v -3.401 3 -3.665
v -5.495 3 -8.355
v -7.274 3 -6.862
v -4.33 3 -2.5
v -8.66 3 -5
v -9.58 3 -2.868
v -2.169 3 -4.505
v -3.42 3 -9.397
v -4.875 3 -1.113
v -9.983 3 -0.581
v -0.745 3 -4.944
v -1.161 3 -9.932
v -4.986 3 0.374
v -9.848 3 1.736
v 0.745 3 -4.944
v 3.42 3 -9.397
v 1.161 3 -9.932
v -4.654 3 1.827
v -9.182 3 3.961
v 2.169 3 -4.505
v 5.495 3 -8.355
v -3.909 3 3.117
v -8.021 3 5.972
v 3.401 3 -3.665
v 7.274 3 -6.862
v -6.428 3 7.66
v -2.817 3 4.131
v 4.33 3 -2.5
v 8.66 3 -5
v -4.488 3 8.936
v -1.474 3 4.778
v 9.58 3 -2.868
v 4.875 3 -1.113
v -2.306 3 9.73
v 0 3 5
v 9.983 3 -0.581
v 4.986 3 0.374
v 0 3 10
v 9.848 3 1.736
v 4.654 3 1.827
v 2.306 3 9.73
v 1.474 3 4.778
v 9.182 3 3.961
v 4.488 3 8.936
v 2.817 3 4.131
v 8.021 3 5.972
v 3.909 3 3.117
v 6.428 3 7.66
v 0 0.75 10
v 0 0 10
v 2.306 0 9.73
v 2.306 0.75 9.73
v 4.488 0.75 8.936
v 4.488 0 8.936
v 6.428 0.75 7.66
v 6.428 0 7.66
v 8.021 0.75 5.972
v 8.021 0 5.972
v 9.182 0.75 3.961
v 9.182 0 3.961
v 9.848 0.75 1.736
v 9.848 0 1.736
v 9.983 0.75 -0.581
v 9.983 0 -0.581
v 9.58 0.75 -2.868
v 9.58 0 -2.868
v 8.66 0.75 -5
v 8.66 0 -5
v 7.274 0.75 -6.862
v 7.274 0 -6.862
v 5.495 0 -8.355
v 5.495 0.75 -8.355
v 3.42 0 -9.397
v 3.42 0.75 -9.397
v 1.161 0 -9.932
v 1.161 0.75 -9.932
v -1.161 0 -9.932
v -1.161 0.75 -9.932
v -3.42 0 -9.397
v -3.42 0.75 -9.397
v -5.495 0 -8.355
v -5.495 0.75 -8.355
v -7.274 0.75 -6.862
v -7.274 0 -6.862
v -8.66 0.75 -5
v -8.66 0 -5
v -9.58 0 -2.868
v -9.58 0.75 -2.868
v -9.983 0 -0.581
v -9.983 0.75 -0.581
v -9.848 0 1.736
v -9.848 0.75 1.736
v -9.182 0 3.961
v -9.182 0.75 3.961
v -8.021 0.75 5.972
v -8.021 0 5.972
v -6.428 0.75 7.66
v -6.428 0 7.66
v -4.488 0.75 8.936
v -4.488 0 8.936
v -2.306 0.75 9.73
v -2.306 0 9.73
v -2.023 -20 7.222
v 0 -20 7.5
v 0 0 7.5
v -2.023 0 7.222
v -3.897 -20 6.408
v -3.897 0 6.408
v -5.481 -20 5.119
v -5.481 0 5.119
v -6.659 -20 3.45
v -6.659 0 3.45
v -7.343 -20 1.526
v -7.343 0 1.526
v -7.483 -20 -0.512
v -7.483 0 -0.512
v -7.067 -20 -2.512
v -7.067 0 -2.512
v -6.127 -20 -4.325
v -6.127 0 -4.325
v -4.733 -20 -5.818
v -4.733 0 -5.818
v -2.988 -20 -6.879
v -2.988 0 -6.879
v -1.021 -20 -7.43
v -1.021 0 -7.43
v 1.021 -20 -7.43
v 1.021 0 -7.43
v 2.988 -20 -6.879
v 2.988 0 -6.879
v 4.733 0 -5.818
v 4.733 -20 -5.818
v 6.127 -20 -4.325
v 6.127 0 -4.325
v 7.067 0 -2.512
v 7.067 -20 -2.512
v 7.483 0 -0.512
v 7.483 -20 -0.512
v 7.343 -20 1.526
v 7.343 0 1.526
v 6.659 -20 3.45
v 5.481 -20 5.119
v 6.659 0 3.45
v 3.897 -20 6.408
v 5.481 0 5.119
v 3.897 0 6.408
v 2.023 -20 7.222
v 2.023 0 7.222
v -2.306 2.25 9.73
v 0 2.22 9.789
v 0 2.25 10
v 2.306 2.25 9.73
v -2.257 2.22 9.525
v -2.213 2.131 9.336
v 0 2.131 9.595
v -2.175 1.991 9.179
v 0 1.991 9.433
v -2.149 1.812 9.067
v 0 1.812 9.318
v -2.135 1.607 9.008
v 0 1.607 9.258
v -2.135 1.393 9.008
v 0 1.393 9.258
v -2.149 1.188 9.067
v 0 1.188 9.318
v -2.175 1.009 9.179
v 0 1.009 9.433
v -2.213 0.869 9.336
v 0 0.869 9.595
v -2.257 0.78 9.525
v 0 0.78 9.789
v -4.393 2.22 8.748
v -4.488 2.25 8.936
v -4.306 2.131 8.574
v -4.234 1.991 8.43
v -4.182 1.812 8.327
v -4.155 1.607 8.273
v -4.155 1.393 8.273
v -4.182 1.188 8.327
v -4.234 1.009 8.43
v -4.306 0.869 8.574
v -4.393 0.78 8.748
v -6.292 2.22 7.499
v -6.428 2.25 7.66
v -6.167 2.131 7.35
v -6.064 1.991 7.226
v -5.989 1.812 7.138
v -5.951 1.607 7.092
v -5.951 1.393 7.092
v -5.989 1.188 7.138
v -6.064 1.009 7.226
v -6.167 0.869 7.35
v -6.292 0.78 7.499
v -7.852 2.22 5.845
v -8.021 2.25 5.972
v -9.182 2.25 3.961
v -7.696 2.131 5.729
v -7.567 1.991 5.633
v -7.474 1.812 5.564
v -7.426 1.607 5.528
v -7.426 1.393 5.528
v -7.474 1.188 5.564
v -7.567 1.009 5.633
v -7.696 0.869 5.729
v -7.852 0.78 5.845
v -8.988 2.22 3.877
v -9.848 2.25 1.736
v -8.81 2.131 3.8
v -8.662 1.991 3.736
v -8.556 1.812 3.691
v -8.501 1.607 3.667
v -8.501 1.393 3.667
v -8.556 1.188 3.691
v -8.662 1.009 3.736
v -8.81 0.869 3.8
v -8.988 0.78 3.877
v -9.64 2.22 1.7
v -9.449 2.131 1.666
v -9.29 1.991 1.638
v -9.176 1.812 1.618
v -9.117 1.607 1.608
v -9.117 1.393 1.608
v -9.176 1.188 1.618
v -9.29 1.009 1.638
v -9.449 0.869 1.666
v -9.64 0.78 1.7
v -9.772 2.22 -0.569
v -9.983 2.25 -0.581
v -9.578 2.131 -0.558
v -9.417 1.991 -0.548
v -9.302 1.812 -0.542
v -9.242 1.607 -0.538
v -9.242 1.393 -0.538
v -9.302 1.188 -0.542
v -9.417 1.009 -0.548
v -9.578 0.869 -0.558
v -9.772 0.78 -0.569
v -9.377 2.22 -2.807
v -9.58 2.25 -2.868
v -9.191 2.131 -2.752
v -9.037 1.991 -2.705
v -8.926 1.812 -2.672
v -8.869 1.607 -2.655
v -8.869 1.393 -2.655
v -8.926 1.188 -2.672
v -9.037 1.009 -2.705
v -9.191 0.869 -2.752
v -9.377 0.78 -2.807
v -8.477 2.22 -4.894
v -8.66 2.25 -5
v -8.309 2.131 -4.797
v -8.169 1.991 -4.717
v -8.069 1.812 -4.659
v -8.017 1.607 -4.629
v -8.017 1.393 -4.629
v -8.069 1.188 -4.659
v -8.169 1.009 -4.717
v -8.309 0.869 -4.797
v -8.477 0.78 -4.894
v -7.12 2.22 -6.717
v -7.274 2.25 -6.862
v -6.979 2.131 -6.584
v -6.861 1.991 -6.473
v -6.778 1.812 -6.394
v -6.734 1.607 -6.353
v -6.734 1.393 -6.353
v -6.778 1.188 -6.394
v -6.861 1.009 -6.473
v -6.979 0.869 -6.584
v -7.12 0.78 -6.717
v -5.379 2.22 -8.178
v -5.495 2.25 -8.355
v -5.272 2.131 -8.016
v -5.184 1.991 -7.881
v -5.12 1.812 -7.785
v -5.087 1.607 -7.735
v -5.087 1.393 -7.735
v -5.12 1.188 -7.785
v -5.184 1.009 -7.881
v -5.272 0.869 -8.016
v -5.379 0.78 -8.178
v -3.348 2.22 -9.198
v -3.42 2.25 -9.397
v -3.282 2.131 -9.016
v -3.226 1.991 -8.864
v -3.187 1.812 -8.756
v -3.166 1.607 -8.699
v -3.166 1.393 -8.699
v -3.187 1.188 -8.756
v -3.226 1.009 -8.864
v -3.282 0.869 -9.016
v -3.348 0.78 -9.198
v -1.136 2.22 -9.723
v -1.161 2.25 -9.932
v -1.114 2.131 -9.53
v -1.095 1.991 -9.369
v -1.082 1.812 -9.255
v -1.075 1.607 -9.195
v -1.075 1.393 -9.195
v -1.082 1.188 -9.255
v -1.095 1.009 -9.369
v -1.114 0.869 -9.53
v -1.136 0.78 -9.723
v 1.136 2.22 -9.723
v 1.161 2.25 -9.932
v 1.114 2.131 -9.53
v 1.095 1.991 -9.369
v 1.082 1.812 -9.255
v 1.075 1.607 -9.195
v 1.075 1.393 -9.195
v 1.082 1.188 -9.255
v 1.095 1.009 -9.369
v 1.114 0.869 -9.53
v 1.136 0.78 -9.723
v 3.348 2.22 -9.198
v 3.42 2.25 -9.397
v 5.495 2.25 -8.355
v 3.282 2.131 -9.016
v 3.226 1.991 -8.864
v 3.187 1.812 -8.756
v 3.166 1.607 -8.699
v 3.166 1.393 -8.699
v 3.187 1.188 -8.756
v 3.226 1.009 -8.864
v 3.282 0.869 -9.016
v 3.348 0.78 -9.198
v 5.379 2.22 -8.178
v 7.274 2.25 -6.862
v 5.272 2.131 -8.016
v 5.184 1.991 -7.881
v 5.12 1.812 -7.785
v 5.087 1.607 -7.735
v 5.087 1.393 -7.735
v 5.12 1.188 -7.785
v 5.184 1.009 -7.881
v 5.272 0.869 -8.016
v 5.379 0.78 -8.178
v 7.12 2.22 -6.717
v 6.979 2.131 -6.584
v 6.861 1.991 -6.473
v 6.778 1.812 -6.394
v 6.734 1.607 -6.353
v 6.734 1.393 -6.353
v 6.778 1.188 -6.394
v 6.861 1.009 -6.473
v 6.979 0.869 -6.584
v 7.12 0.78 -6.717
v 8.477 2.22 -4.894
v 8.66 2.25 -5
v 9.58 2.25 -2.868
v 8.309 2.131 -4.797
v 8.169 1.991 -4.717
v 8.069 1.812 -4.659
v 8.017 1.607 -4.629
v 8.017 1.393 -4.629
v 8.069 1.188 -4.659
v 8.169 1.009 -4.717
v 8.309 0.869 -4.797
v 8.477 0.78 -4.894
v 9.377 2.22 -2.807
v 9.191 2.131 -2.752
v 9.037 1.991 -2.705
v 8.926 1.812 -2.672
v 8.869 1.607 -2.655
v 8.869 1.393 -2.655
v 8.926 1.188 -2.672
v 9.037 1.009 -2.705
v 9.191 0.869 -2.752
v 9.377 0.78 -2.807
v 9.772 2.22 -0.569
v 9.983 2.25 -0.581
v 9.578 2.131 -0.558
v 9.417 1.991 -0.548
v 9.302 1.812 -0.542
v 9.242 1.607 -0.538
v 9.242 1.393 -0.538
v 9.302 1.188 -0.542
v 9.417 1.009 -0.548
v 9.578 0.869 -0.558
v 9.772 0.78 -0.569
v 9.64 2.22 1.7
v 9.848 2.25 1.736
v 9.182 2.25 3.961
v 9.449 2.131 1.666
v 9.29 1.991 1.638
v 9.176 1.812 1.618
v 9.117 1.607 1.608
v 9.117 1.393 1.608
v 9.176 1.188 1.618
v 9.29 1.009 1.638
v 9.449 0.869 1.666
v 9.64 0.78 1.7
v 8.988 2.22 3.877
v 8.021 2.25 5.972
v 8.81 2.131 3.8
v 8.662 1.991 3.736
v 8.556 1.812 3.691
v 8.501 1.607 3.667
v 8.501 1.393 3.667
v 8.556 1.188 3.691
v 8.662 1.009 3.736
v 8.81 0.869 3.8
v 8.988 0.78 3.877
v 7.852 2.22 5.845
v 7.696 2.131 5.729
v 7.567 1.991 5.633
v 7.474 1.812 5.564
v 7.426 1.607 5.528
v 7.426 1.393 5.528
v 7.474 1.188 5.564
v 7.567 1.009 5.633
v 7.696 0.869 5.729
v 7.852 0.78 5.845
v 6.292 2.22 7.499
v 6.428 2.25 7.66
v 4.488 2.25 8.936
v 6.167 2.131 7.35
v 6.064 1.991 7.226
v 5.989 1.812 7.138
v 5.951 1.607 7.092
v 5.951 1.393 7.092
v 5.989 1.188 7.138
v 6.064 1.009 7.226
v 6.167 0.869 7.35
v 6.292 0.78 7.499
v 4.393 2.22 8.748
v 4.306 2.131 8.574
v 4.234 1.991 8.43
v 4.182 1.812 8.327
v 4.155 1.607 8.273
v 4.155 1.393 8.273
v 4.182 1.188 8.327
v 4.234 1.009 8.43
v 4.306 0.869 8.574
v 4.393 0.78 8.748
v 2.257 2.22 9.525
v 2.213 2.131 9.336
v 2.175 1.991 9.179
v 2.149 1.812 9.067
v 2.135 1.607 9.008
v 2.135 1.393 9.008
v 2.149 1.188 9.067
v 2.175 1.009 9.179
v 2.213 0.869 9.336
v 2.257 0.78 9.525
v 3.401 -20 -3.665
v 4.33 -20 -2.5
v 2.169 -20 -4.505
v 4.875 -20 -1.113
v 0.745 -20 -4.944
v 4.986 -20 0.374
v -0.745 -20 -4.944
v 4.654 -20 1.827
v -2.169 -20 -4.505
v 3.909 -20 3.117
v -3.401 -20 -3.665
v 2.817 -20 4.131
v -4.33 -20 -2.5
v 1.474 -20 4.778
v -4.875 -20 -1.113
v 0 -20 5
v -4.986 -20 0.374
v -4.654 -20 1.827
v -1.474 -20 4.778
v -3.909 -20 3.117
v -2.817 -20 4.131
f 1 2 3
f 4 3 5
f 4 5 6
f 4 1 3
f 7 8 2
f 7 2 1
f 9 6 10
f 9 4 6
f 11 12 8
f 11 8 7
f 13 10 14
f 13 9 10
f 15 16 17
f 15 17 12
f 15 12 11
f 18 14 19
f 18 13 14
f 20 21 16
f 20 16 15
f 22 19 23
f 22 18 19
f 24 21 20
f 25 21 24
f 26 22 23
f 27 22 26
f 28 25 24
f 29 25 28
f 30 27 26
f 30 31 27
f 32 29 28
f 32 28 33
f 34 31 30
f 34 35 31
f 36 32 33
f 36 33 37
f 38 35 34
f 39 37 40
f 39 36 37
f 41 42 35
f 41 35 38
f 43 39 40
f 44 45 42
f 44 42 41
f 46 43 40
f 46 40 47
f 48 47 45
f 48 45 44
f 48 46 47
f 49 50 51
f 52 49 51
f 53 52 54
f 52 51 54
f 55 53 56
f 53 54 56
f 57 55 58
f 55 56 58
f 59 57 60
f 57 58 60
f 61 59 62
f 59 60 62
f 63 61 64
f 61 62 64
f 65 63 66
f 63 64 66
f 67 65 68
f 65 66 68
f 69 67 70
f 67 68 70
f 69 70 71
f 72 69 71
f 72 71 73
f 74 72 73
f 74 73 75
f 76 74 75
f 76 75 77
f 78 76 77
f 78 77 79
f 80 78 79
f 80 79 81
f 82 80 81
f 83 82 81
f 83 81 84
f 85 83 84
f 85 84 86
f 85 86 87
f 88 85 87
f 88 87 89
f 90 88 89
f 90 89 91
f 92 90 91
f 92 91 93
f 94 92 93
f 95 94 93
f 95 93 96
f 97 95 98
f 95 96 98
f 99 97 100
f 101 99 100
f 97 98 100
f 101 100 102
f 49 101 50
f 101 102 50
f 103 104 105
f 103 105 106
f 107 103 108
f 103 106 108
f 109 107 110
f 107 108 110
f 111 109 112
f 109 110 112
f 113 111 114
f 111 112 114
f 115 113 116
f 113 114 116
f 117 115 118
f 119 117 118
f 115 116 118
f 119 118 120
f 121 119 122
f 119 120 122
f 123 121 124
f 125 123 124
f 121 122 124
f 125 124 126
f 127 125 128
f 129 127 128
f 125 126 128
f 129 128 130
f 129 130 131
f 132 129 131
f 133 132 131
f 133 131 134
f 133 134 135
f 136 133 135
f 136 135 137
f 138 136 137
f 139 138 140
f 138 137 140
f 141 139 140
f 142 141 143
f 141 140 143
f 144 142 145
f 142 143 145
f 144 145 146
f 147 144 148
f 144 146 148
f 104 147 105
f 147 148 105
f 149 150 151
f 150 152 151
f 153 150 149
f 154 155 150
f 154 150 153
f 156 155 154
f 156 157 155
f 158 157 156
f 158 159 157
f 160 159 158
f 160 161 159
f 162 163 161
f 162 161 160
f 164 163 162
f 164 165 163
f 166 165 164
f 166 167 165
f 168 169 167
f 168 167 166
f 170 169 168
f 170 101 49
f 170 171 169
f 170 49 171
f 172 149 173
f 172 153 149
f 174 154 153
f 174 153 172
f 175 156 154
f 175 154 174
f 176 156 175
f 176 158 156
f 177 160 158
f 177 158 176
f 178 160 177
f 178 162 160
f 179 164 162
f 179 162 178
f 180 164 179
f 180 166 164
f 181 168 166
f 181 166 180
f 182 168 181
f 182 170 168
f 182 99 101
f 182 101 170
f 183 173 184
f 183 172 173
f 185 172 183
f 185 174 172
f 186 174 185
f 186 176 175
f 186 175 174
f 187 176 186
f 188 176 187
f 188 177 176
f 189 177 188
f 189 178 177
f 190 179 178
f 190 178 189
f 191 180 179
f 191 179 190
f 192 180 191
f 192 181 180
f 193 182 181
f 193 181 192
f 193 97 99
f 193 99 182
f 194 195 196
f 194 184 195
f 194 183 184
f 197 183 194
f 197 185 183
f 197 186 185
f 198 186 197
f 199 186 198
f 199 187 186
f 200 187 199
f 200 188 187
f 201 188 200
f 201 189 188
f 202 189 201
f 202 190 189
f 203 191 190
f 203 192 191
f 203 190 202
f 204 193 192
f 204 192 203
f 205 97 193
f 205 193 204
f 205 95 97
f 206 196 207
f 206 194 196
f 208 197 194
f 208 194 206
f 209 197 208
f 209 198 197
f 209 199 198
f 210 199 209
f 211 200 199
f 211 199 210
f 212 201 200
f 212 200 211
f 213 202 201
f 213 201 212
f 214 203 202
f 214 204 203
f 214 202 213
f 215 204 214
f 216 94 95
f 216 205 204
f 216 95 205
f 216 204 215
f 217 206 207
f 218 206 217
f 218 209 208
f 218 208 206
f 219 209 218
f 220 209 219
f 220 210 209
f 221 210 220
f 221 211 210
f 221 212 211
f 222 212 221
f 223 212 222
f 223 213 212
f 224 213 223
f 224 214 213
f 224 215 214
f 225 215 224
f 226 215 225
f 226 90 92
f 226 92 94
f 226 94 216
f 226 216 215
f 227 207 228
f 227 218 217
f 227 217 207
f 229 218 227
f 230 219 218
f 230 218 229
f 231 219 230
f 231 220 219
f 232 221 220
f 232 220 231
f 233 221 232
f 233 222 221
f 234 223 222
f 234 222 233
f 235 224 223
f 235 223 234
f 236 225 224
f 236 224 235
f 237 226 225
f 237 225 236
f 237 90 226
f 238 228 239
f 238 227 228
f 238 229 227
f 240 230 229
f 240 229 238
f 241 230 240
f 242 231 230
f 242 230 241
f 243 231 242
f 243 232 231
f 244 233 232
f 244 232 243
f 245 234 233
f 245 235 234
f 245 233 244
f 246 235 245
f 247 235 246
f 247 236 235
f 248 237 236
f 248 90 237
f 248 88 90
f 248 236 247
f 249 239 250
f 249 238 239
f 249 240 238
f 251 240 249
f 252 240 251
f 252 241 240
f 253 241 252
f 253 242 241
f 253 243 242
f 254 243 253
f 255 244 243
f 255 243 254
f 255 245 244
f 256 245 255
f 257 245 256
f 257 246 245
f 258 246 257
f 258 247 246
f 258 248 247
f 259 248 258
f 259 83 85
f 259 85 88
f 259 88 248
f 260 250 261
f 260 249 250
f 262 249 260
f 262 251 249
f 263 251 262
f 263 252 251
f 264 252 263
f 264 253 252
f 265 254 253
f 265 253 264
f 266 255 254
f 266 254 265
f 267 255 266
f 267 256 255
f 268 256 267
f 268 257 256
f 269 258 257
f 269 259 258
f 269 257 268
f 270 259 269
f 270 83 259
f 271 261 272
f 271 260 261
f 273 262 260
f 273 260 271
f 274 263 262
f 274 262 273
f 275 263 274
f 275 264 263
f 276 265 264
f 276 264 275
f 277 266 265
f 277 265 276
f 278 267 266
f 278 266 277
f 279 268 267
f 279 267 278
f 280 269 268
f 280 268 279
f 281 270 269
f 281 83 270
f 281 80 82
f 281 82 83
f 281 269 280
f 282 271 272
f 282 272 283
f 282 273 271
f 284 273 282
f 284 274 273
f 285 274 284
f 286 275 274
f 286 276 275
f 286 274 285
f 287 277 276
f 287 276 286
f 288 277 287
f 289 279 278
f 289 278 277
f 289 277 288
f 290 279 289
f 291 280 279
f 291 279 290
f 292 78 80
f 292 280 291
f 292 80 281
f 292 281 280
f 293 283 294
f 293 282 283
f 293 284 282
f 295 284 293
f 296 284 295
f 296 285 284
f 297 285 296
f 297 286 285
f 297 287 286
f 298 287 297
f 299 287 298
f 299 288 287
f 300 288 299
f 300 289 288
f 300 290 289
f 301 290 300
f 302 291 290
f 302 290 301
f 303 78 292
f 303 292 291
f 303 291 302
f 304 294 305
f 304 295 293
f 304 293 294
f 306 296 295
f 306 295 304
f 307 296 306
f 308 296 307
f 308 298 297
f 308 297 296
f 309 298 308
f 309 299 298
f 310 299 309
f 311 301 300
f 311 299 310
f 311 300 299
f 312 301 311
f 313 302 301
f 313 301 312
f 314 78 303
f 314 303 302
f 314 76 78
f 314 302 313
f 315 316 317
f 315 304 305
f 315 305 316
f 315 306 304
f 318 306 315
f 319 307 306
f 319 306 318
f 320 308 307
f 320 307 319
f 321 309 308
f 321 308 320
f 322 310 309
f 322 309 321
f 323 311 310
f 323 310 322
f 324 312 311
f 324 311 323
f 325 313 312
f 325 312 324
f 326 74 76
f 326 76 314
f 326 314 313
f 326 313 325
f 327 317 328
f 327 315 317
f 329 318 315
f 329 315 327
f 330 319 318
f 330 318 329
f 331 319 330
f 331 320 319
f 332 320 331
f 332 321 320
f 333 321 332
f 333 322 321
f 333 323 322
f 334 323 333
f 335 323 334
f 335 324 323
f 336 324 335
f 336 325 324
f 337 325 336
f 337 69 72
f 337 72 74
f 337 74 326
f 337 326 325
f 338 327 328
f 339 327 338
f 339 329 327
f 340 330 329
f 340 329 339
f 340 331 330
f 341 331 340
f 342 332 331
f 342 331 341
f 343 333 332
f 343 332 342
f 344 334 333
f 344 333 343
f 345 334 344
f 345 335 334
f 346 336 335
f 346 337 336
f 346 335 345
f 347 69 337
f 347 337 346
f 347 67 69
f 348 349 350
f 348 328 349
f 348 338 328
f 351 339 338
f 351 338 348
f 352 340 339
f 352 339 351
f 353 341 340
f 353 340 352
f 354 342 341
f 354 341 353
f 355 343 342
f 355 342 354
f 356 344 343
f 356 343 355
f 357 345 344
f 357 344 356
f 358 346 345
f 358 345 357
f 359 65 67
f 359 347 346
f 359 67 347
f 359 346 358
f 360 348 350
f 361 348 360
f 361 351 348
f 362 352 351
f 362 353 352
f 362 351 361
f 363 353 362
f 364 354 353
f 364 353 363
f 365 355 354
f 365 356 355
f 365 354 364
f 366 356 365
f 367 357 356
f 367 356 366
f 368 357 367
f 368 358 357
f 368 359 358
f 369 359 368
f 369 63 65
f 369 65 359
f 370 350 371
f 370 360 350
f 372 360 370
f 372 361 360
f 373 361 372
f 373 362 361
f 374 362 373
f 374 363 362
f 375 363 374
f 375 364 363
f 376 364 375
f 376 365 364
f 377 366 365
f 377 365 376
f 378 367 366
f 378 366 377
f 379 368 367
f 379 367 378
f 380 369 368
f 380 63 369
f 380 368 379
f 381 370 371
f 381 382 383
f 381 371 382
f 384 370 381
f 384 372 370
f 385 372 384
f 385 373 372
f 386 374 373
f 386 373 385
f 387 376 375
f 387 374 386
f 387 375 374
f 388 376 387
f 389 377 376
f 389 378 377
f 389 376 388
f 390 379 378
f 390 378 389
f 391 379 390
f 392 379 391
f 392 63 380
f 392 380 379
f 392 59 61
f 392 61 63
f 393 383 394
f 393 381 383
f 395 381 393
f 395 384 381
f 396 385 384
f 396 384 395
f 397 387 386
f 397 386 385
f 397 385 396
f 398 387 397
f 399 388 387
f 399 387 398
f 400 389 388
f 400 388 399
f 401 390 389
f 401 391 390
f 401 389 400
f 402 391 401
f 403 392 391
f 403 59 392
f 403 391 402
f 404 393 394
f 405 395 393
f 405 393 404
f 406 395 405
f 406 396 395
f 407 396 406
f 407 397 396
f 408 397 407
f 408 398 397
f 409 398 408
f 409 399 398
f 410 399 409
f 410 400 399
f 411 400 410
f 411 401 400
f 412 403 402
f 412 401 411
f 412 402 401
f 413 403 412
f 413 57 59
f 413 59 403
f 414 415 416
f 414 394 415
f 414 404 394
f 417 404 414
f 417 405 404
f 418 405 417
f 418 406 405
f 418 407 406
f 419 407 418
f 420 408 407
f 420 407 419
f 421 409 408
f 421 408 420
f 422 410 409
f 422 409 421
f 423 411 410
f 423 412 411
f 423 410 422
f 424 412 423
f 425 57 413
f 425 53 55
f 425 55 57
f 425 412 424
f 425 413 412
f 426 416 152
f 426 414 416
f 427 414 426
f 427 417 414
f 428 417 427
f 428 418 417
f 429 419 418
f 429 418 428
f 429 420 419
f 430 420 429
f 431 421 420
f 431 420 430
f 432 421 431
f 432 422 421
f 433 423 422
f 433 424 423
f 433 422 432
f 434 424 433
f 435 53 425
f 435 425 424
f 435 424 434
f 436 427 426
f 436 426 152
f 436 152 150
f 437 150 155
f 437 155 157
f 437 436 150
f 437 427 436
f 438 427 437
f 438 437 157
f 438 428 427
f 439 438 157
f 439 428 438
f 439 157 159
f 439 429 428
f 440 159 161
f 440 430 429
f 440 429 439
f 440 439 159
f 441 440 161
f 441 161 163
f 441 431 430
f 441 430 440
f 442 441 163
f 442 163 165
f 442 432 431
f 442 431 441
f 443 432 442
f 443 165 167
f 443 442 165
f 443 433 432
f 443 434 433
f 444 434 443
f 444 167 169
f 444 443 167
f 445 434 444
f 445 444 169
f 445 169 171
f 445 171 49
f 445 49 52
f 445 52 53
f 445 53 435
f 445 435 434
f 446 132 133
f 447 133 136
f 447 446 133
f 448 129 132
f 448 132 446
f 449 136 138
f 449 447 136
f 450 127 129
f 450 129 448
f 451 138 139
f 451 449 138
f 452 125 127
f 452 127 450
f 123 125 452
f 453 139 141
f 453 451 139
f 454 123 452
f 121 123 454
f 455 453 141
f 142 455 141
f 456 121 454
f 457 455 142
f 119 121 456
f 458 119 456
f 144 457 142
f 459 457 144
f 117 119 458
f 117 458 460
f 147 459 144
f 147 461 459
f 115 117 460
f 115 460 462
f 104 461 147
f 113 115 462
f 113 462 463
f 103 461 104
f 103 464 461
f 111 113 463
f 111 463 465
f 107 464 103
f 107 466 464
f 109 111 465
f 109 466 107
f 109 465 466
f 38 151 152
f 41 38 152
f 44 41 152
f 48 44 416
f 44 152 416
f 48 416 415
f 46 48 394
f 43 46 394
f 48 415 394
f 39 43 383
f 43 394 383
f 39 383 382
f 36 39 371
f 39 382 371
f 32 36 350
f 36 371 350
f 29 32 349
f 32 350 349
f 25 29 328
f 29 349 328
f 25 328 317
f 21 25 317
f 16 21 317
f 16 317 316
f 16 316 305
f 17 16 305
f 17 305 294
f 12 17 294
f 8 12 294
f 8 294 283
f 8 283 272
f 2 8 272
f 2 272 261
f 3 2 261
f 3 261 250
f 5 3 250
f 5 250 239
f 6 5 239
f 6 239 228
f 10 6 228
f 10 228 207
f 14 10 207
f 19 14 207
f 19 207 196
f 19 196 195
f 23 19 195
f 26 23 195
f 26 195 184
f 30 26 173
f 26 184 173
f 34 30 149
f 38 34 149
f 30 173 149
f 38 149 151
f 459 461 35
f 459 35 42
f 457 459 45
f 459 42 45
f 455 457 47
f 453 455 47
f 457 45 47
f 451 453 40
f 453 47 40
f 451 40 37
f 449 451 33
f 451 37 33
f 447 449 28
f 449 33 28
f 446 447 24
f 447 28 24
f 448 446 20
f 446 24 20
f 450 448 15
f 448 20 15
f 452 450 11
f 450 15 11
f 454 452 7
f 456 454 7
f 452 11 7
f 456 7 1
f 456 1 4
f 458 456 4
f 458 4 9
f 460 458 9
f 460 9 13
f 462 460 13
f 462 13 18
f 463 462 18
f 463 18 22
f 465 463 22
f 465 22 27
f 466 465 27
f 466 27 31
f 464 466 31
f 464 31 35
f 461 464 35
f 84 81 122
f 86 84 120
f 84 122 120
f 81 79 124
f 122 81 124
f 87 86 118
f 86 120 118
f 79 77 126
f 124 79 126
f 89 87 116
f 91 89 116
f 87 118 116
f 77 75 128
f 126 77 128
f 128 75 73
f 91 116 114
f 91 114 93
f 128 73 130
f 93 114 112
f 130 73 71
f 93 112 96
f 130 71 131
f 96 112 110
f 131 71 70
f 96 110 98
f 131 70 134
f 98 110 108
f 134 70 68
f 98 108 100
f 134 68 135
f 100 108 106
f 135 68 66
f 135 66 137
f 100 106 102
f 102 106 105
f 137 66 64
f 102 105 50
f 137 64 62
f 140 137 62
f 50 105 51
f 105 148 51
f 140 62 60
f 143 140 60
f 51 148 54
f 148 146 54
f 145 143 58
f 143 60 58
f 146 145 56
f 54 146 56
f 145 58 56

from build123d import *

# Parameters (mm, degrees)
CROQUIS1_R              = 10
SALIENTE_EXTRUIR1_DEPTH = 3
CROQUIS2_R              = 0.75
CROQUIS4_R              = 7.5
SALIENTE_EXTRUIR2_DEPTH = 20
CROQUIS3_R              = 5
CORTAR_EXTRUIR1_DEPTH   = 28


with BuildPart() as part:
    # Croquis1 → Saliente-Extruir1 (new body)
    with BuildSketch(Plane(origin=(0, 0, 0), x_dir=(1, 0, 0), z_dir=(0, 1, 0))):
        with Locations(Location((0, 0, 0), (0, 0, 270))):
            Circle(CROQUIS1_R)
    extrude(amount=SALIENTE_EXTRUIR1_DEPTH)

    # Croquis2 → Cortar-Revolución1 (revolve, cut)
    with BuildSketch(Plane(origin=(0, 0, 0), x_dir=(0, 0, -1), z_dir=(1, 0, 0)), mode=Mode.PRIVATE) as cortar_revoluci_n1_sk:
        with Locations((10, 1.5)):
            Circle(CROQUIS2_R)
    revolve(cortar_revoluci_n1_sk.sketch.rotate(Axis((0, 3, 0), (0, -1, 0)), 180), axis=Axis((0, 3, 0), (0, -1, 0)), mode=Mode.SUBTRACT)

    # Croquis4 → Saliente-Extruir2 (add)
    with BuildSketch(Plane.XZ):
        with Locations(Location((0, 0, 0), (0, 0, 90))):
            Circle(CROQUIS4_R)
    extrude(amount=SALIENTE_EXTRUIR2_DEPTH)

    # Croquis3 → Cortar-Extruir1 (cut, through all)
    with BuildSketch(Plane(origin=(0, 3, 0), x_dir=(1, 0, 0), z_dir=(0, 1, 0))):
        with Locations(Location((0, 0, 0), (0, 0, 270))):
            Circle(CROQUIS3_R)
    extrude(amount=-CORTAR_EXTRUIR1_DEPTH, mode=Mode.SUBTRACT)


solid = part.part
